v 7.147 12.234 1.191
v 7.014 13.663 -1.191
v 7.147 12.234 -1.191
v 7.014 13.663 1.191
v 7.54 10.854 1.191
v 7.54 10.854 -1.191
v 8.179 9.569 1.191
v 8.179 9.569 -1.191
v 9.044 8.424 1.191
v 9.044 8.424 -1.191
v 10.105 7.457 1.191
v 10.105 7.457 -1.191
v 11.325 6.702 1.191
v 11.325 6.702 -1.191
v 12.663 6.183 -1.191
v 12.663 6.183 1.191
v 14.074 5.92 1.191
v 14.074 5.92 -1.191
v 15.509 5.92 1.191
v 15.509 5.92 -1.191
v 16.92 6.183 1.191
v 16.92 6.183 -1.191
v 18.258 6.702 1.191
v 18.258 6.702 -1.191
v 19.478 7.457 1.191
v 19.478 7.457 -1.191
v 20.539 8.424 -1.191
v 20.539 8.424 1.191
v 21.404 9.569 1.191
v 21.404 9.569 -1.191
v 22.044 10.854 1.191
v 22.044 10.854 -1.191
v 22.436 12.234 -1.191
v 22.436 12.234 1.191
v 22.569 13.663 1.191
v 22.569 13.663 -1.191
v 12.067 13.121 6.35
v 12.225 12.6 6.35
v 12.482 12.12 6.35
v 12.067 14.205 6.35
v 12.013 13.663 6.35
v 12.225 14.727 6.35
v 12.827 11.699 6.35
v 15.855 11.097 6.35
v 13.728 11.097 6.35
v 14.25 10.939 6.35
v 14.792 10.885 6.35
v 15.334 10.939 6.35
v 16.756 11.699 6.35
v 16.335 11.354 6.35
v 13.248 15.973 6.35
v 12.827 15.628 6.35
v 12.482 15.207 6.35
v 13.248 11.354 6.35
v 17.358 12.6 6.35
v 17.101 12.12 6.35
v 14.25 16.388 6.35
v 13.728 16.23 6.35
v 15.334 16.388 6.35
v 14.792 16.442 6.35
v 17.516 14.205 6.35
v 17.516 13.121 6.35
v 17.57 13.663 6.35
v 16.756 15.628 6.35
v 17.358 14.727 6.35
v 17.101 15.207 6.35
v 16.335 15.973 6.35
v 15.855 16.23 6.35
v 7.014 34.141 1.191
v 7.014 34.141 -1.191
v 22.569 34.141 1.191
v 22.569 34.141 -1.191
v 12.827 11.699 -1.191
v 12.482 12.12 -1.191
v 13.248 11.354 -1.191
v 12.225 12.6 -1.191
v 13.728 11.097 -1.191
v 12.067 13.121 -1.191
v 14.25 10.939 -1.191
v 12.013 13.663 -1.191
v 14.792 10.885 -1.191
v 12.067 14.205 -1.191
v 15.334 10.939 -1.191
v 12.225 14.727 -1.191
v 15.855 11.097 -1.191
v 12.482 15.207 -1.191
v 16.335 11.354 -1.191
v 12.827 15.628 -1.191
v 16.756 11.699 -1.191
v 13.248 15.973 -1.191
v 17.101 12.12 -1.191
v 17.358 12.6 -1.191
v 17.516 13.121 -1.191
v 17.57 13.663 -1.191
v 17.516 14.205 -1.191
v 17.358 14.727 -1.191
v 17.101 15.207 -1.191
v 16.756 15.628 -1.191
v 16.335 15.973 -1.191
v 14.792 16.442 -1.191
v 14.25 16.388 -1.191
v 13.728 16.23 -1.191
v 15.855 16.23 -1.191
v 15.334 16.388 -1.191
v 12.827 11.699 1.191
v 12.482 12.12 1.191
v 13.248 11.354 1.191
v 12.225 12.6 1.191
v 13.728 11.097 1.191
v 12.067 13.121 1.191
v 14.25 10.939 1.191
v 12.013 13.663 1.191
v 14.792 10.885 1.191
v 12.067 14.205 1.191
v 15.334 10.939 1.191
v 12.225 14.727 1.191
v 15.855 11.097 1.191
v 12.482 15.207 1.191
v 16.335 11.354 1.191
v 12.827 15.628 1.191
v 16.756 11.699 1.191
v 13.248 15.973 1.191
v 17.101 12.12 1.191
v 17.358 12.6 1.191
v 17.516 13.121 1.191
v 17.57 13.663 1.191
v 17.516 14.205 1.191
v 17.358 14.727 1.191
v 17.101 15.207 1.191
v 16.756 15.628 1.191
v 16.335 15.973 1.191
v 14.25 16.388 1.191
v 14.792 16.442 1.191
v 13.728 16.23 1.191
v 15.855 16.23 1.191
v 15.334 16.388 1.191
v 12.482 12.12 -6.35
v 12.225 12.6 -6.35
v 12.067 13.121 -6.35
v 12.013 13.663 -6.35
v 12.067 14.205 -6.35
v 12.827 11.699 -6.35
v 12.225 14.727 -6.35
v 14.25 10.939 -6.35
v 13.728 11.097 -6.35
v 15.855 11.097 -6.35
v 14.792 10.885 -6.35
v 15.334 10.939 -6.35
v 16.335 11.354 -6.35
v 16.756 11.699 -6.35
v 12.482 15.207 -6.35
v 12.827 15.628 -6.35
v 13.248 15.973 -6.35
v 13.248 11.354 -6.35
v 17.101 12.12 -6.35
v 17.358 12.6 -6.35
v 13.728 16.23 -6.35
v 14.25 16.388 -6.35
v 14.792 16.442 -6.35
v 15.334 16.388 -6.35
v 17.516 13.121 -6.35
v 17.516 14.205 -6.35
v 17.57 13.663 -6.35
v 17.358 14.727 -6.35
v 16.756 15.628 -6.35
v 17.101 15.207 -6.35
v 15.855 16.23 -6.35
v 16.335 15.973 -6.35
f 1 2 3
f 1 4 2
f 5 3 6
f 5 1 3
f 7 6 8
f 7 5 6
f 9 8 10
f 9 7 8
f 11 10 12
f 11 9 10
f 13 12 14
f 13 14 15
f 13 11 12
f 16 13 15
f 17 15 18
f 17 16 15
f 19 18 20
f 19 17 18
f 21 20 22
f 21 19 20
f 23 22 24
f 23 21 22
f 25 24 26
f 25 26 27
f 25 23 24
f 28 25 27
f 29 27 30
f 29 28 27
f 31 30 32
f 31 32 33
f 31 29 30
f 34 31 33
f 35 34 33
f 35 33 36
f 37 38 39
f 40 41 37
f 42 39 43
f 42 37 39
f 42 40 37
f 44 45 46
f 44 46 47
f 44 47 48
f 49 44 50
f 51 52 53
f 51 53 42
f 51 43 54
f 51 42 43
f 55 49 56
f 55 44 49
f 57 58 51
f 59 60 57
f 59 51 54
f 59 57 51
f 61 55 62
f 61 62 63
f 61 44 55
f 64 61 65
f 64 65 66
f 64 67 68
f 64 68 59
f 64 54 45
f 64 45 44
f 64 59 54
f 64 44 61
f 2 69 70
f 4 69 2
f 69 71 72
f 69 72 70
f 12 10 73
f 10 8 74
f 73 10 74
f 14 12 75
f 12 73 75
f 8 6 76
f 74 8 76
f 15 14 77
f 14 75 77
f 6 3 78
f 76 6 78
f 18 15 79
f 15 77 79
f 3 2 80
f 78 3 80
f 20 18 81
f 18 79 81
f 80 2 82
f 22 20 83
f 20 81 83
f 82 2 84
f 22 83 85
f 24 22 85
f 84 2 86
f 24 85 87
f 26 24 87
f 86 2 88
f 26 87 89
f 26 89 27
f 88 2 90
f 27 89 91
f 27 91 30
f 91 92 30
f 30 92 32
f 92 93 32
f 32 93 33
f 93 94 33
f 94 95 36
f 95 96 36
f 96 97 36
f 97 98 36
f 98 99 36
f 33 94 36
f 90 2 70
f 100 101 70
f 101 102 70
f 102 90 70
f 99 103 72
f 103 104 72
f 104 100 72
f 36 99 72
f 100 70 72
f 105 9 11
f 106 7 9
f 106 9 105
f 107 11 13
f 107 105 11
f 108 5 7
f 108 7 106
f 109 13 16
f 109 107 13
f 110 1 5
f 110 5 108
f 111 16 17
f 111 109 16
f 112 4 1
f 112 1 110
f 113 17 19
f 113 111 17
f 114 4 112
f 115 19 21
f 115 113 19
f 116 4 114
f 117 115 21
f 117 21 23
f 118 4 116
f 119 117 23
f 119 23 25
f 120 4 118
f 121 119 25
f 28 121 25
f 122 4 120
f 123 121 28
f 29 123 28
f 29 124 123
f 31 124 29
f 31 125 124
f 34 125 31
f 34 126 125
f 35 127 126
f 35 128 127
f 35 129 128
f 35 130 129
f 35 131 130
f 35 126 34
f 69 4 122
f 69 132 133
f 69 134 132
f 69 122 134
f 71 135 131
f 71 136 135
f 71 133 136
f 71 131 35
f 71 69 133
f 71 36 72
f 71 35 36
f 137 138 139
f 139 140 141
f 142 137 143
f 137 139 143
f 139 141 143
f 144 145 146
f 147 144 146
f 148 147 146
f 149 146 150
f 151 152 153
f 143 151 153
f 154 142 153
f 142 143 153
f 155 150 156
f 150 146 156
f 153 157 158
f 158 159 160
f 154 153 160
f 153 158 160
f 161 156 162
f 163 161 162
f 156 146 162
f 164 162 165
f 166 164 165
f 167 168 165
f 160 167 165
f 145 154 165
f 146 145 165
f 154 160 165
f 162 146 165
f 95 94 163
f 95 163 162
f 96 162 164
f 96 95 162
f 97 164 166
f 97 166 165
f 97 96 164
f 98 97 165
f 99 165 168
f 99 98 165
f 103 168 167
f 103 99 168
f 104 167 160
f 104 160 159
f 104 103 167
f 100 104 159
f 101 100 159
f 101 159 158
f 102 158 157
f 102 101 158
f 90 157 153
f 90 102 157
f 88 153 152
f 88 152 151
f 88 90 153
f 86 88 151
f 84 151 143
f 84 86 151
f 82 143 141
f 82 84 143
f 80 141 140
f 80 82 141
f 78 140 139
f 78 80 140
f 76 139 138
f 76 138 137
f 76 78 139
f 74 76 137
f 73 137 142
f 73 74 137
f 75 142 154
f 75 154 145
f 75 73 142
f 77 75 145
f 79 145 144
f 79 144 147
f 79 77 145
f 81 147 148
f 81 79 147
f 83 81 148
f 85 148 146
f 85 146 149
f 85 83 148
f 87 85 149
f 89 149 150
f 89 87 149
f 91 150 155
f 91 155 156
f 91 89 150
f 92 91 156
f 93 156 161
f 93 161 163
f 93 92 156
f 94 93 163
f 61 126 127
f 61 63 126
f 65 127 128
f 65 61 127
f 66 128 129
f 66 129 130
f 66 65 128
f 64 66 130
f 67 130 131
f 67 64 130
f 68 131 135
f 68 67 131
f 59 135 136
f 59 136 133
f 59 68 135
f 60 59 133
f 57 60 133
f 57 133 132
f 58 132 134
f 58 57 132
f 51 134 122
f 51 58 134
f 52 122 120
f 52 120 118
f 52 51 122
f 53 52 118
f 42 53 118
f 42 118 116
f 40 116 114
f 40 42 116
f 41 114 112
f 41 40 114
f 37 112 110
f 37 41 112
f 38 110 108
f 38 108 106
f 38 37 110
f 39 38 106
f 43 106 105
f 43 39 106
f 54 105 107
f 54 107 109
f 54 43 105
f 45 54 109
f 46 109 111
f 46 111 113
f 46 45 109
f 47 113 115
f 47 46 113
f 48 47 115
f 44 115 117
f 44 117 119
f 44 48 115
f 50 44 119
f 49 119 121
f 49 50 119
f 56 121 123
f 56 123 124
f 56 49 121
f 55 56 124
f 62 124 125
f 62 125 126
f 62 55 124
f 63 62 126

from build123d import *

# Parameters (mm, degrees)
BOSS_EXTRUDE1_DEPTH = 1.190625
SKETCH2_R           = 2.778125
BOSS_EXTRUDE2_DEPTH = 6.35


with BuildPart() as part:
    # Sketch1 → Boss-Extrude1 (new, symmetric)
    with BuildSketch(Plane.XY):
        with BuildLine():
            Line((22.568685476, 13.663463824), (22.568685476, 34.140593758))
            Line((22.568685476, 34.140593758), (7.014425609, 34.140593758))
            Line((7.014425609, 34.140593758), (7.014425609, 13.663463824))
            ThreePointArc((7.014425609, 13.663463824), (14.791555542, 5.886333891), (22.568685476, 13.663463824))
        make_face()
    extrude(amount=BOSS_EXTRUDE1_DEPTH, both=True)

    # Sketch2 → Boss-Extrude2 (add, symmetric)
    with BuildSketch(Plane.XY):
        with Locations((14.791555542, 13.663463824)):
            Circle(SKETCH2_R)
    extrude(amount=BOSS_EXTRUDE2_DEPTH, both=True)


solid = part.part
